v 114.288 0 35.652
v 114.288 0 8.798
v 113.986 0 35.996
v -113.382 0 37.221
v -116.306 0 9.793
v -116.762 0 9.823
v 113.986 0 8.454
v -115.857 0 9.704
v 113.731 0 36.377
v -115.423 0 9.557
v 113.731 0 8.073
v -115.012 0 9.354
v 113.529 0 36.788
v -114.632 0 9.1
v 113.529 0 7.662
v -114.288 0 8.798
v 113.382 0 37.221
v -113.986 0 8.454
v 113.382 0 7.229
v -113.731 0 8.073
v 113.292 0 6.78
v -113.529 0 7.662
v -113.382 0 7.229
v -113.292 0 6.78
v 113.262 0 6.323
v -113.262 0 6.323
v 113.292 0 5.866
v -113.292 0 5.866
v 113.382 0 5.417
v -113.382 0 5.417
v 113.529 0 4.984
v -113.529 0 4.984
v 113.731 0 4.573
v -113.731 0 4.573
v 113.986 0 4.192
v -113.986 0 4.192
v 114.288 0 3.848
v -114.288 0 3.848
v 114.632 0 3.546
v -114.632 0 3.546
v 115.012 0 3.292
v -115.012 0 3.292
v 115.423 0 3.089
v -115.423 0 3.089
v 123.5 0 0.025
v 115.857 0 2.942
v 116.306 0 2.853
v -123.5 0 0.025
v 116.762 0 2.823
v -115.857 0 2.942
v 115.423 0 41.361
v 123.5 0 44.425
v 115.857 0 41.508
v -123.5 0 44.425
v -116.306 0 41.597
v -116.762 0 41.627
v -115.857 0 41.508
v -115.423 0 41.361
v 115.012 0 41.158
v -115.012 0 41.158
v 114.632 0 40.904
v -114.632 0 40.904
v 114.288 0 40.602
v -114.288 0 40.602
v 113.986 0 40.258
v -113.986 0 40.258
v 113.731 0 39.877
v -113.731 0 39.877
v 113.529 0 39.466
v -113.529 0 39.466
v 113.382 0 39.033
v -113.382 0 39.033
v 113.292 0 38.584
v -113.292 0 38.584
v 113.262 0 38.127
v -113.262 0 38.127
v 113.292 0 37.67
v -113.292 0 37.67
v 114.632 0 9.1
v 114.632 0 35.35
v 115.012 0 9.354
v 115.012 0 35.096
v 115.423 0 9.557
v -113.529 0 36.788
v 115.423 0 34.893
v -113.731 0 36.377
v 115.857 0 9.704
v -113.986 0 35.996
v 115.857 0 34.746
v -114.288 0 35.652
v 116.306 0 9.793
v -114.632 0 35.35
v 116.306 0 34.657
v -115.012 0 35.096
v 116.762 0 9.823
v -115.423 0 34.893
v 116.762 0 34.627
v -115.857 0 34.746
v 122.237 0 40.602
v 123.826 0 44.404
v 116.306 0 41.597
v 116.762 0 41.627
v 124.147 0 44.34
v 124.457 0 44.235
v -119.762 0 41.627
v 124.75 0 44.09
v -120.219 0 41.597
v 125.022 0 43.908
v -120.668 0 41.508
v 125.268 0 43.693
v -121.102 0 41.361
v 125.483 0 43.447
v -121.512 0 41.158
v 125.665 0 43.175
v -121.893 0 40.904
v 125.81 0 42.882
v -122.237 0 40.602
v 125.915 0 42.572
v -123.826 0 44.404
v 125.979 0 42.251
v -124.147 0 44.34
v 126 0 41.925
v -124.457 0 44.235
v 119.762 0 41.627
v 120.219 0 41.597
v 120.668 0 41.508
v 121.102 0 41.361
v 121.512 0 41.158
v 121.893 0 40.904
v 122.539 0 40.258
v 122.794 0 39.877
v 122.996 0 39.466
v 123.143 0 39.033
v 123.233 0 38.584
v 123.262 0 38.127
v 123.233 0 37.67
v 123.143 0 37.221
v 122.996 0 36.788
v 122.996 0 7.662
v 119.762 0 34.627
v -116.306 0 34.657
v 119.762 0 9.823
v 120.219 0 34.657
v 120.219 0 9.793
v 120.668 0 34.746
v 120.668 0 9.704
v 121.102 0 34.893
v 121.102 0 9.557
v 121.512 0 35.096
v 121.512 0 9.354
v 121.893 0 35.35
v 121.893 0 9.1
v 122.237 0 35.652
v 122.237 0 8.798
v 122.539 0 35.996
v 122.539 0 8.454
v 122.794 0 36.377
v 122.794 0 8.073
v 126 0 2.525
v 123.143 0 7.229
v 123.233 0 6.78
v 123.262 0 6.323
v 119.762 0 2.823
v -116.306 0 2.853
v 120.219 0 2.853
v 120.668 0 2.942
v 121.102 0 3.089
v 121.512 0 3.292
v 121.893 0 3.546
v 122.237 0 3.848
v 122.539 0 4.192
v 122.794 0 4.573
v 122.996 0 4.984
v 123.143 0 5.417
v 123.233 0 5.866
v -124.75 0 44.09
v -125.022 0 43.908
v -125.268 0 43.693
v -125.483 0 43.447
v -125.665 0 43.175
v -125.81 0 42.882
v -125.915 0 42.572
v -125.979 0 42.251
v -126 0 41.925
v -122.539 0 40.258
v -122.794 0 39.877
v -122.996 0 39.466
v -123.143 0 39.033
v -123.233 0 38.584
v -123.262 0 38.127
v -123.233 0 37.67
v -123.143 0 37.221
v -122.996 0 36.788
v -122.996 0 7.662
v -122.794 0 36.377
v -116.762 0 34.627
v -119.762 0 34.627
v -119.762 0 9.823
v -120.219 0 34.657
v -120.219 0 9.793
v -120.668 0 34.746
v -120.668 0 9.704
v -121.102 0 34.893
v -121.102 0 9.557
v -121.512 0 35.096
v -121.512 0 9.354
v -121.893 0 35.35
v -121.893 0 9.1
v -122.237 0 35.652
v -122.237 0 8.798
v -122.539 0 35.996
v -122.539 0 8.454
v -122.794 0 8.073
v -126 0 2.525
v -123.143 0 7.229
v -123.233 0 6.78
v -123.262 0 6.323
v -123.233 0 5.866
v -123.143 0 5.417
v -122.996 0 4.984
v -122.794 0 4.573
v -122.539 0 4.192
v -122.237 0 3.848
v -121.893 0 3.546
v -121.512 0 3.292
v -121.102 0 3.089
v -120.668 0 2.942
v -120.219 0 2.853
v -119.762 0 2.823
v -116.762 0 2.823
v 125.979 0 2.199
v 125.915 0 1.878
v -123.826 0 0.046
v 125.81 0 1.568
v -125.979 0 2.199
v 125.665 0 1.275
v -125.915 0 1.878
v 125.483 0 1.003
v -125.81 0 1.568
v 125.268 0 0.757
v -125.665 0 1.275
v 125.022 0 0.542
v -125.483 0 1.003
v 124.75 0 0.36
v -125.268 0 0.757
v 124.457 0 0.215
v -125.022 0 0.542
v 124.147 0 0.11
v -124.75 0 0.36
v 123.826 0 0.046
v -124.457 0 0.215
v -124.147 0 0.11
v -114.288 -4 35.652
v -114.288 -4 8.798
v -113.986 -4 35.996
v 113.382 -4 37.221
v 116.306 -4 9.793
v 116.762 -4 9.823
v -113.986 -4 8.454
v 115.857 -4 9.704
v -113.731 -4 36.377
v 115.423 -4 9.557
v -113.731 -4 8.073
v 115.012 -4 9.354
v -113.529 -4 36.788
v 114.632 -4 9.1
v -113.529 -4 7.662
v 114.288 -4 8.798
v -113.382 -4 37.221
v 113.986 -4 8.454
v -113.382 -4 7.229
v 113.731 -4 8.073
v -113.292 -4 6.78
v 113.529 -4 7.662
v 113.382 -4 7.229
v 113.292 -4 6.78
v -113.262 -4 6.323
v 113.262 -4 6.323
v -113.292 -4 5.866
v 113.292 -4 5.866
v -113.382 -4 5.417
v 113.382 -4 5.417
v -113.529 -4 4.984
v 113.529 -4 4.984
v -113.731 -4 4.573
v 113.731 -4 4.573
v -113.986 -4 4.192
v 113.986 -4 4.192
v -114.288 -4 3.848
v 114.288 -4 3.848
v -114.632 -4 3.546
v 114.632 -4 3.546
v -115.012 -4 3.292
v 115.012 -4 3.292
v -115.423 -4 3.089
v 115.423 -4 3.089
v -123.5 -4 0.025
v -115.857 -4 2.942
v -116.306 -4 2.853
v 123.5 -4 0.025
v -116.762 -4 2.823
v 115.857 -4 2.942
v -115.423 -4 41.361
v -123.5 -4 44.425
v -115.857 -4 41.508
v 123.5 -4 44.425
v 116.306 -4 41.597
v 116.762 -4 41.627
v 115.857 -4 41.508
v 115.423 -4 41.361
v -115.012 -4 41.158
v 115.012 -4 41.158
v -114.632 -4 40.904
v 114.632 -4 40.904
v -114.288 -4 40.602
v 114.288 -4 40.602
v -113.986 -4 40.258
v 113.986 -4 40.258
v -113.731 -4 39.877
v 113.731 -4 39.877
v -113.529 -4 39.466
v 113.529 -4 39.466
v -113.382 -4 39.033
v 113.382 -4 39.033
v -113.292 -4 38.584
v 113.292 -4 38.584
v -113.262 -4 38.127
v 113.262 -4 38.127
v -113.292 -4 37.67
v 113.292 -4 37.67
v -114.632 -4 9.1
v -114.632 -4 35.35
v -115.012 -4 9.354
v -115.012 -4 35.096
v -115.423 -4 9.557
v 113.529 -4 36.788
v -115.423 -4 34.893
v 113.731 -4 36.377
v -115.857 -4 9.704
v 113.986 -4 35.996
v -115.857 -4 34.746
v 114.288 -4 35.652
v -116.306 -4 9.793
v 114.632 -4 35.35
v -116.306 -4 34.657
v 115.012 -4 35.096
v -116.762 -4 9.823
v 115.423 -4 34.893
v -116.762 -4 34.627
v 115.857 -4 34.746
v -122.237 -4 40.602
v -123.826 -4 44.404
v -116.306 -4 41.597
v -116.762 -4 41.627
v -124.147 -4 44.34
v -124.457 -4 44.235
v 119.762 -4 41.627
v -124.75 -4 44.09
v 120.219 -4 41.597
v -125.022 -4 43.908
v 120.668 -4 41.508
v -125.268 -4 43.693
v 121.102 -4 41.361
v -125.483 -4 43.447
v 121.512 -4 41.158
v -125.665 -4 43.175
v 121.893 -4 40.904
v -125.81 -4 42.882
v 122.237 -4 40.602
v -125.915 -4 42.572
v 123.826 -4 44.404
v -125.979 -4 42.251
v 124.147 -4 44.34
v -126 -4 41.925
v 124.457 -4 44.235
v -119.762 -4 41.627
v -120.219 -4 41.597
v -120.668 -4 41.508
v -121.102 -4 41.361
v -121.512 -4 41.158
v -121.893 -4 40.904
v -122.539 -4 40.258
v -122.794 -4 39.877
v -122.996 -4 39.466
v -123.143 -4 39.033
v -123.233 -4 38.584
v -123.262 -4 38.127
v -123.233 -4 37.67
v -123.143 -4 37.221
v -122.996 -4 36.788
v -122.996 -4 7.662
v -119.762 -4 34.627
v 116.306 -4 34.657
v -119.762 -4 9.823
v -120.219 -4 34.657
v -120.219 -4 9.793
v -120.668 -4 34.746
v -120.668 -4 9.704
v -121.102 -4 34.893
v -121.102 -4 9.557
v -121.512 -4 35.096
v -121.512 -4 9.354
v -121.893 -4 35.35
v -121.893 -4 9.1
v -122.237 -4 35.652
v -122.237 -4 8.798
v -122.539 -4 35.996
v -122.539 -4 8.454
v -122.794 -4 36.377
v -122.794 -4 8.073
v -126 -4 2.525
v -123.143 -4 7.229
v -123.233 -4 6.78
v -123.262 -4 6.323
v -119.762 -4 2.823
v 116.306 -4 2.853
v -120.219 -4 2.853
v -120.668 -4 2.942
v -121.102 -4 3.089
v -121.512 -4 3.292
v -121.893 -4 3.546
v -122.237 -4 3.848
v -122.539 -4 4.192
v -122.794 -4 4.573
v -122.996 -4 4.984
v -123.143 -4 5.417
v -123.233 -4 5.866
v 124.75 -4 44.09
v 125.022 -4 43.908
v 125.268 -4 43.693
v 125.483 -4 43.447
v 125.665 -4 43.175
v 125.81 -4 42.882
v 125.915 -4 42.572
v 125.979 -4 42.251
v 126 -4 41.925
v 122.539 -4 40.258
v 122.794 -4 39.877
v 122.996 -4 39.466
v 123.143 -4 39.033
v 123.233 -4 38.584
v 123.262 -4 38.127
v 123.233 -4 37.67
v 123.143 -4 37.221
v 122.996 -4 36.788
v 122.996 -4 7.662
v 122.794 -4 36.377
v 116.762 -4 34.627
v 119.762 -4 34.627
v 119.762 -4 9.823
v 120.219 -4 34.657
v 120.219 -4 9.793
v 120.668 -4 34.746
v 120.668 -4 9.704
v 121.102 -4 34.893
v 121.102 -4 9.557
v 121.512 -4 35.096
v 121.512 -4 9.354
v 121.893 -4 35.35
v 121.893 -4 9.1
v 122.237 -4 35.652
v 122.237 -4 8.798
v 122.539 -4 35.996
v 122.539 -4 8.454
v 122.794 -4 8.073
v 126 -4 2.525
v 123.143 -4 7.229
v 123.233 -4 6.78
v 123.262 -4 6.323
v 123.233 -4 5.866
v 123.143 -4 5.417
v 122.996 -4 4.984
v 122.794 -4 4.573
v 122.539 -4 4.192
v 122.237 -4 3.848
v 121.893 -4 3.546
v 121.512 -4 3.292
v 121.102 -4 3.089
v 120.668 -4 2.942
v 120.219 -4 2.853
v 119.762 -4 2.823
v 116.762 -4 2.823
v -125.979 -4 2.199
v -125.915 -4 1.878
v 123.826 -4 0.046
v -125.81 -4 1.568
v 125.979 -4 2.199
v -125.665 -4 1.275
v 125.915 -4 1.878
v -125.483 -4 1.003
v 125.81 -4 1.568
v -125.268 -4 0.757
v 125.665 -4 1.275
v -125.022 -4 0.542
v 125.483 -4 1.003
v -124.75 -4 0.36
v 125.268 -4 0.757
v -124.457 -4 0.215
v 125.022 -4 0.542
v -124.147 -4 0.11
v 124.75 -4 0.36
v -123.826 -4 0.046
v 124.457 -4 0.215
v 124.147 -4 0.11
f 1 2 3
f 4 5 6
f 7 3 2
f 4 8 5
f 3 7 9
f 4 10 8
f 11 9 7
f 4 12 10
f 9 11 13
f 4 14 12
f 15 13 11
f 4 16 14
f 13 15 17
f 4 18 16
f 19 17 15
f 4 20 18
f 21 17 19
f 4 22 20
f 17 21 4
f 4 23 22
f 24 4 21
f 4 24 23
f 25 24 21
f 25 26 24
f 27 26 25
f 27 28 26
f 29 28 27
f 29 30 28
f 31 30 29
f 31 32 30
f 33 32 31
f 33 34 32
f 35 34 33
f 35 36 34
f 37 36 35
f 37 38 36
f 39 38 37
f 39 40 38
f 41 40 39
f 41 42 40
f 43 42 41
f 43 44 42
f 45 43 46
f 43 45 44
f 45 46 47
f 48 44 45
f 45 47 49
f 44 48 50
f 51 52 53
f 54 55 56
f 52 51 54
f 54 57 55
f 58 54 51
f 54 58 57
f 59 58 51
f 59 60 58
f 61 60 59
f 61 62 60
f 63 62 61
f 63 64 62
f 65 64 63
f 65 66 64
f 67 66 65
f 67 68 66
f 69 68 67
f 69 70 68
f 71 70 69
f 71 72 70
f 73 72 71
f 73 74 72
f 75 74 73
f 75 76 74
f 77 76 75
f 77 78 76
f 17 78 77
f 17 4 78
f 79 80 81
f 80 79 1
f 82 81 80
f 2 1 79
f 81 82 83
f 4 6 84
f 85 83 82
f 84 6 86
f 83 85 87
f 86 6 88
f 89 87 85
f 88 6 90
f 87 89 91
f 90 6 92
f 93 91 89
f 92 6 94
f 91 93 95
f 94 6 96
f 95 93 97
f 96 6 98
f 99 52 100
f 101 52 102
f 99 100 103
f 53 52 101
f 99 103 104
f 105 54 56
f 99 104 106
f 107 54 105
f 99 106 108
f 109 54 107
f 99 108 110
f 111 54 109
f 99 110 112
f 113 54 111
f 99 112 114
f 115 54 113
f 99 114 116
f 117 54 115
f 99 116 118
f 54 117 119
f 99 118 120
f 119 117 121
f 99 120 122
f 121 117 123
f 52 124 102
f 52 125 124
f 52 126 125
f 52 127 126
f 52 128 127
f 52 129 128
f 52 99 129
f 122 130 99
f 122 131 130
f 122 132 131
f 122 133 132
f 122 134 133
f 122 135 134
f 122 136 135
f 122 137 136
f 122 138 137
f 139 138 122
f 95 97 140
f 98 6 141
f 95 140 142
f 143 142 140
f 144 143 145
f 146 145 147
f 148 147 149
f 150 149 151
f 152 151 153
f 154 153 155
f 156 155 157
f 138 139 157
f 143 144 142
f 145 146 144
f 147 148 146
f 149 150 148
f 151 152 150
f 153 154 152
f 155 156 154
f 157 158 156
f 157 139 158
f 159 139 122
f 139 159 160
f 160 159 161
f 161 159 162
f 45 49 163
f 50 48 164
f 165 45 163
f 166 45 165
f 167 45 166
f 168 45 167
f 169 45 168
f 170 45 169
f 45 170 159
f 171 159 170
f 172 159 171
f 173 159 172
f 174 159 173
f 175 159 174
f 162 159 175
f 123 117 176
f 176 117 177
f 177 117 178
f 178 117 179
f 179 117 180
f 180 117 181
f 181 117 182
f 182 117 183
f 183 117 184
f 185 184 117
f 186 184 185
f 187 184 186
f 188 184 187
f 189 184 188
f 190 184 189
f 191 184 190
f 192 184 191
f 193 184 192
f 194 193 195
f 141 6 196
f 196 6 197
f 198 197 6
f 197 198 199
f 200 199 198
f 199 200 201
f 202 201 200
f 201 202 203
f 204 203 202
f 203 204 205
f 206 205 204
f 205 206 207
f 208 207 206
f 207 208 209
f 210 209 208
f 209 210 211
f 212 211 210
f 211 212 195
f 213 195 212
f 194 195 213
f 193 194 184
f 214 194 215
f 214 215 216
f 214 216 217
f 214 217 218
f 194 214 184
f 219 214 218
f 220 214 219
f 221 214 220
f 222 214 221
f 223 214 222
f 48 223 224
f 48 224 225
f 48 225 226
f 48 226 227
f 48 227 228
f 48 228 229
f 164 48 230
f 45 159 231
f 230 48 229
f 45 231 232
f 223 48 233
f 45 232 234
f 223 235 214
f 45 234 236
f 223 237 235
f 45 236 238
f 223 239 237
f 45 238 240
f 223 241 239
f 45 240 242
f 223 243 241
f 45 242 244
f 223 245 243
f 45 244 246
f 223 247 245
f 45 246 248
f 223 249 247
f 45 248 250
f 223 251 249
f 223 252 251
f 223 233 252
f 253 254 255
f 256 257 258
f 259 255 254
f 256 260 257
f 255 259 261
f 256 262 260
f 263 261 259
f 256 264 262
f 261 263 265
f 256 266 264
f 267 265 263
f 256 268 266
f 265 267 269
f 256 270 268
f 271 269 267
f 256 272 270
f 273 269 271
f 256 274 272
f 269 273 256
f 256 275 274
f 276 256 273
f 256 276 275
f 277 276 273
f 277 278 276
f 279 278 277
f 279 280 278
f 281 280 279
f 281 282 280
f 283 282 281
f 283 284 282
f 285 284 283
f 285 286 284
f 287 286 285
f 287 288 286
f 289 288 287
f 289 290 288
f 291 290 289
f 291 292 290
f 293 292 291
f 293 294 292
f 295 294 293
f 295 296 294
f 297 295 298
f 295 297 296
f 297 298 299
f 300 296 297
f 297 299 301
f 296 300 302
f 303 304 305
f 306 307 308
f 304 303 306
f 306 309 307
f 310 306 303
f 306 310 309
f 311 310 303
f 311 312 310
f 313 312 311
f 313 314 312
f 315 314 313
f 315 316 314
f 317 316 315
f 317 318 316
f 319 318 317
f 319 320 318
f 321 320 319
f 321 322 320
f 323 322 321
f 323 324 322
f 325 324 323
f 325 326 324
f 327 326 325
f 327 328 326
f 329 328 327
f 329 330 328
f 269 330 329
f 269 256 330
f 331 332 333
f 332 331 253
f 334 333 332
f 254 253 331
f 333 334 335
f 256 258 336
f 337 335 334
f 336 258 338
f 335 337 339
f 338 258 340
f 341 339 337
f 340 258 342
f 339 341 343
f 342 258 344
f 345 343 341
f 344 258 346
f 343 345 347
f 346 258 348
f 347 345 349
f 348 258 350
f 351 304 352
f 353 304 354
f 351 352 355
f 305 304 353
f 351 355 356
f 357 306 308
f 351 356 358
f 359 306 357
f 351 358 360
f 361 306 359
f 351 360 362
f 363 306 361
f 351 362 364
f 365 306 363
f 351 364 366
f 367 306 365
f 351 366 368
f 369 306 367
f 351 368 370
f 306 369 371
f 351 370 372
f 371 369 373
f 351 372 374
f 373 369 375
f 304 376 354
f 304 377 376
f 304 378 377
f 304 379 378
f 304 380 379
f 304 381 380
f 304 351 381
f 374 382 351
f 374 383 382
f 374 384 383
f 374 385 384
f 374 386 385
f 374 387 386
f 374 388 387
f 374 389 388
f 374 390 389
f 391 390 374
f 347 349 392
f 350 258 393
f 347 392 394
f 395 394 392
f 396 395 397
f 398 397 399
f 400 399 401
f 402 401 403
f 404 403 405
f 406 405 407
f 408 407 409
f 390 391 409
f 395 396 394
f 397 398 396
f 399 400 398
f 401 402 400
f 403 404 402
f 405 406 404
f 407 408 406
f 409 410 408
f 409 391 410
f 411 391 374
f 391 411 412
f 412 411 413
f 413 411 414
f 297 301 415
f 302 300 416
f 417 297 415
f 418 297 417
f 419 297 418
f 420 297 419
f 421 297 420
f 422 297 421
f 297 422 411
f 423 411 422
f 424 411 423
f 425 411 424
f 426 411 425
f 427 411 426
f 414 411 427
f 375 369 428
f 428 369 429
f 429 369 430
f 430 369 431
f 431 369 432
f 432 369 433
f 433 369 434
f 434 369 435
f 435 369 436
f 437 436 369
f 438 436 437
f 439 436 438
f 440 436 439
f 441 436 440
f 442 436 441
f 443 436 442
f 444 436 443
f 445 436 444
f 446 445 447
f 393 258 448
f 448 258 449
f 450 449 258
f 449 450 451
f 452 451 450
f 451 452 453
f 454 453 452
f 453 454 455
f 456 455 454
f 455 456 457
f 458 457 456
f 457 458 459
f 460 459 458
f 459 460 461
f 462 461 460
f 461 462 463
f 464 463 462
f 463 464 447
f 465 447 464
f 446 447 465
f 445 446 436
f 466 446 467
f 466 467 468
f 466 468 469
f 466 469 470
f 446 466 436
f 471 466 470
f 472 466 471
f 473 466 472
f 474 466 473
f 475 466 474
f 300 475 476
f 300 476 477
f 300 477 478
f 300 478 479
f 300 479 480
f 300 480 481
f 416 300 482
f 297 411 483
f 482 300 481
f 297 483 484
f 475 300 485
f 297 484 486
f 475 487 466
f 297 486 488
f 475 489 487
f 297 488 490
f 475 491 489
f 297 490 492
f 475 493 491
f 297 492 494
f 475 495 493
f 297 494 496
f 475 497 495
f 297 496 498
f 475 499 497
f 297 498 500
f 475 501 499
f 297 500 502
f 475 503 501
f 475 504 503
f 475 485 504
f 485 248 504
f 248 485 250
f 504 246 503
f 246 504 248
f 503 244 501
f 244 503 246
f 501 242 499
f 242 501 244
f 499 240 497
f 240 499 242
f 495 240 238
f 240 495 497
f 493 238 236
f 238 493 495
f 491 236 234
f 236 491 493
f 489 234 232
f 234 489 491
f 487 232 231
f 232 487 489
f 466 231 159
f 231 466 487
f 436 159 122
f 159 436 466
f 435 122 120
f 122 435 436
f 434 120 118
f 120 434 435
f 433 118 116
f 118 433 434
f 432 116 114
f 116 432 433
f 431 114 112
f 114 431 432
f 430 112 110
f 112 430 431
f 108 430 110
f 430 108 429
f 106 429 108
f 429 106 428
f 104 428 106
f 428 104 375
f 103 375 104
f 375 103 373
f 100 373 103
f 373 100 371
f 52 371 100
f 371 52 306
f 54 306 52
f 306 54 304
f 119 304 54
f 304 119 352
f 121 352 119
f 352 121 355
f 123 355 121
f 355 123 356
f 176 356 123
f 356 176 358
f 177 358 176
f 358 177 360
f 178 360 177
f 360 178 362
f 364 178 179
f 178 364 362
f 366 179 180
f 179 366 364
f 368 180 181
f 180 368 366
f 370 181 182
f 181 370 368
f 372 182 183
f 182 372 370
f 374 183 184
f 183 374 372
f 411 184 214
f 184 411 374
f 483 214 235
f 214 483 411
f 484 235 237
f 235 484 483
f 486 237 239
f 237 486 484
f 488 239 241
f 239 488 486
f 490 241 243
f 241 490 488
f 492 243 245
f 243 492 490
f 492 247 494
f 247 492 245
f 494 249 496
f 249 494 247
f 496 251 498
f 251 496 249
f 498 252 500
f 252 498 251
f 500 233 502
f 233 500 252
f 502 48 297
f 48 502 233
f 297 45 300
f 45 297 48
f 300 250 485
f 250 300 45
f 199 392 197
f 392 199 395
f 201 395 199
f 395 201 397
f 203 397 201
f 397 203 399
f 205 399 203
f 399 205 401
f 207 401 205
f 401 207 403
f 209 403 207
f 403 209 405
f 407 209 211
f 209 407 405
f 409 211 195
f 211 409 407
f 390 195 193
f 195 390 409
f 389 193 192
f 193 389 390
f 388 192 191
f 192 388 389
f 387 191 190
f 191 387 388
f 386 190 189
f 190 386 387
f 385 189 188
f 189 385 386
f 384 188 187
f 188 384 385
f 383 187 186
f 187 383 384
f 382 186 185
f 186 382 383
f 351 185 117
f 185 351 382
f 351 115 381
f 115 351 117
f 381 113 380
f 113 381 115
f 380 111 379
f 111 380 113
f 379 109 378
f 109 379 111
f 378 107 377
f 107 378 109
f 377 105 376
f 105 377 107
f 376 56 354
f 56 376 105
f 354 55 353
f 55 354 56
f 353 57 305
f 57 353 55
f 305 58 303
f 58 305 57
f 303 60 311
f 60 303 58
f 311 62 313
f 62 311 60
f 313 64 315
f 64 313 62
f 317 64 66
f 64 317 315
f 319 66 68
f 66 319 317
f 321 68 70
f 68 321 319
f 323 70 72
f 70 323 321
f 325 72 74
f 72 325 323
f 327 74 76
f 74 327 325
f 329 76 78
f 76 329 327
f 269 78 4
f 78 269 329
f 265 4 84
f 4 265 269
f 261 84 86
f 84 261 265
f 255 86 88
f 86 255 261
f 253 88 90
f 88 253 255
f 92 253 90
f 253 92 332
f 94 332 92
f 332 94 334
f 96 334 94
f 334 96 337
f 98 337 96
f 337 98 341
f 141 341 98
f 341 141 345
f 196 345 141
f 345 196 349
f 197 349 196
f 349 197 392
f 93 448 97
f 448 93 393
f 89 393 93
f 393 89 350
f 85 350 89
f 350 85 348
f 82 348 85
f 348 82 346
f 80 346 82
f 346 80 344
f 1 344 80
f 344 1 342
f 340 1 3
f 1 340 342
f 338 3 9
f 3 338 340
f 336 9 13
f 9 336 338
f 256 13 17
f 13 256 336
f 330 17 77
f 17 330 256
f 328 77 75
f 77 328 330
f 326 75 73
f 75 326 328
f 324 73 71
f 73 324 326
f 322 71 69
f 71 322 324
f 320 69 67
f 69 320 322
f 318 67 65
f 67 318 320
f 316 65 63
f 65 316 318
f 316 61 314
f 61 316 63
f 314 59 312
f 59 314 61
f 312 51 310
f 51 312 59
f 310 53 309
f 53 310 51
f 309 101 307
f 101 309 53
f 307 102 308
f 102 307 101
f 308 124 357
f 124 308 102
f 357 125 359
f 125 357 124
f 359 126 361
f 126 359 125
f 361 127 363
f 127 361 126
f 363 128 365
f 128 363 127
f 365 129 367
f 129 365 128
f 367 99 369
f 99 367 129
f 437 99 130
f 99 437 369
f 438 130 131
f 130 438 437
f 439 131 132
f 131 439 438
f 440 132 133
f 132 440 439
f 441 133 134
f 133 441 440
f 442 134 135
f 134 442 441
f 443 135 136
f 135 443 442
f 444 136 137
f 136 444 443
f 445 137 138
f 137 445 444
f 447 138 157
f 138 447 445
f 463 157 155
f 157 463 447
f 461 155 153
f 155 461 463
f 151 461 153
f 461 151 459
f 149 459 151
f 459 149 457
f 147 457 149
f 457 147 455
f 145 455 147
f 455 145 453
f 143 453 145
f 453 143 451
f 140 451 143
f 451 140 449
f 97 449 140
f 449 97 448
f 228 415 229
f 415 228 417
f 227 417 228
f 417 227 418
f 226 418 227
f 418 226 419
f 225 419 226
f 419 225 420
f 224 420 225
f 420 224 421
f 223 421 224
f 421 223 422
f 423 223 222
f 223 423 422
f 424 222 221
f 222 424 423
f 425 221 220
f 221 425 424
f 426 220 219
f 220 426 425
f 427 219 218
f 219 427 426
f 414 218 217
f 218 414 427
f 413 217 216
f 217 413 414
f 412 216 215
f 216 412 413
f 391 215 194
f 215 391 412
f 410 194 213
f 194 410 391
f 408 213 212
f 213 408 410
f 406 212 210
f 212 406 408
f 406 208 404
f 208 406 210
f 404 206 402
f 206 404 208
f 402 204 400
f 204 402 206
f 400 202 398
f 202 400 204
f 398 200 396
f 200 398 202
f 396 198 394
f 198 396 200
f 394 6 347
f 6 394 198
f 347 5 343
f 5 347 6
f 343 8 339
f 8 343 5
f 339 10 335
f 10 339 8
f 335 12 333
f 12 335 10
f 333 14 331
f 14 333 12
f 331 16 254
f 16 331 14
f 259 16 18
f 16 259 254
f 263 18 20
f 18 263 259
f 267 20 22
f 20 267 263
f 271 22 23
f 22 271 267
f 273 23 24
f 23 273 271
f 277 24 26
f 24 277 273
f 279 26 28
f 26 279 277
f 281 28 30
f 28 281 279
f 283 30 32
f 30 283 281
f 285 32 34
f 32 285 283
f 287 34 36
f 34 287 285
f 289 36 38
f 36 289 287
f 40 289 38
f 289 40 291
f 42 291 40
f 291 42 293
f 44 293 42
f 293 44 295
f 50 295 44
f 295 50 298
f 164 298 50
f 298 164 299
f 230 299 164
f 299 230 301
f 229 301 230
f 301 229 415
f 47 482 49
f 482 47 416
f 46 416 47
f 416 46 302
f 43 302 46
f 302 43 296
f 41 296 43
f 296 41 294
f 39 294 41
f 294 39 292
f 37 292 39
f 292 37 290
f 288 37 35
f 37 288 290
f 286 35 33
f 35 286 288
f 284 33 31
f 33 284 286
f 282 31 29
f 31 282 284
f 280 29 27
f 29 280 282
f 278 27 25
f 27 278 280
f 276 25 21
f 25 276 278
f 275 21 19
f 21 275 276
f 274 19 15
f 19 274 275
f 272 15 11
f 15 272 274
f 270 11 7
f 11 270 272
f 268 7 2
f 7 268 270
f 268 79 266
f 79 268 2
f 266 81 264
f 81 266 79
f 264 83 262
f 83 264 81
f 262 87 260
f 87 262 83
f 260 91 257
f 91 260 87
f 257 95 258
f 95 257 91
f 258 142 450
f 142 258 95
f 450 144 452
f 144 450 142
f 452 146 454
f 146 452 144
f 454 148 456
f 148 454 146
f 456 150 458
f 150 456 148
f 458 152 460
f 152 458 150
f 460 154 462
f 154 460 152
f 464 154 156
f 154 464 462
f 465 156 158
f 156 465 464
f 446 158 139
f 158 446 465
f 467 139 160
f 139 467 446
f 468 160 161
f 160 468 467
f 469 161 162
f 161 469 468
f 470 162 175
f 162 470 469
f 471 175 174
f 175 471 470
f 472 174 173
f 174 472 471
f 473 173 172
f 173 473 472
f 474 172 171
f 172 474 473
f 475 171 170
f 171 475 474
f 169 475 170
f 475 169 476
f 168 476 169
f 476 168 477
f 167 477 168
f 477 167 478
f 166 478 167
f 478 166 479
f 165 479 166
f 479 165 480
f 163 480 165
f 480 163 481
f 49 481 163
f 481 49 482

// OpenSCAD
// Lab Rax generic equipment tray + faceplate (wizard template).
// Faceplate derived from the Pi4 baseline; rack holes follow the four-corner layout of the user-supplied
// 1U blank plate (faceplate_mounting.json): EVERY rack unit gets 4 holes, never a single centre pair.
// The wizard appends override assignments at the end of this file.
// PROPOSED, UNVALIDATED: printed fit, strength and rack clearance are UNKNOWN.
$fn=48;
part="assembly";            // assembly, faceplate, tray, combined, rear_bracket
// Device envelope (mm). Origin of hole coordinates = device front-left corner, seen from above.
dev_w=85; dev_d=56; dev_h=20;
feet=[];                     // [[x,y,w,d,h],...] underside feet, device frame front-left origin
holes=[];                   // [[x,y],...] mounting hole centres
hole_d=2.7;                 // device mounting hole diameter
device_mount="inserts";     // inserts, pegs, clips, straps
standoff=6;                 // device lift above tray floor
insert_pilot=3.2;           // pilot for heat-set insert (inserts mode)
board_t=1.6;                // board/flange thickness (pegs, clips)
joint="screw";              // screw, single ("snap" retired 2026-10-19: too brittle; kept as history)
u=1;                        // faceplate height in rack units
keystones=[];               // [x,...] keystone centres on faceplate (X=0 centre)
// Keystone v2 (2026-10-19, now the fallback; see ks_style): re-modelled from measurements of Brian's reference keystone frame
// (14.5 x 16 opening was too narrow when printed). Opening 14.8 x 16.6 through the plate, plus a rear collar
// 19.8 x 27.85 reaching 9.2 mm behind the front face (bottom lip to 10.4) that carries the latch ramp and catches.
ks_w=14.8; ks_h=16.6;       // front opening
ks_ow=19.8; ks_ob=11.9; ks_ot=15.95; ks_od=9.2; ks_lip=10.4;  // collar width, below/above opening centre, depth
ports=[];                   // [[x,z,w,h,r],...] faceplate cut-outs, z from slot bottom, r=corner radius
front_gap=12;               // device front to faceplate rear face
margin=8;                   // tray border around device
dev_off_x=0;                // device left/right offset, mm from centred (+ = right, seen from the front)
dev_off_y=0;                // device front/back offset, mm added to front_gap (+ = toward the rear)
dev_rot=0;                  // device rotation seen from above: 0, 90, 180, 270 (90/270 swap width and depth)
rear_support=false;         // heavy/deep equipment: tray runs to the rear posts and screws to a rear bracket
coupon=[];                  // test coupon: [x0,x1,ymax] keeps only that slice of the part

// 4 mm plate (owner default 2026-10-18). Corner radius is limited by the four-corner holes:
// the reference holes sit 1.6 mm from the top/bottom edge, so larger corners would cut into them.
rack_pitch=44.45; plate_gap=0.05; legacy_slot_offset=1.225;
plate_bottom=plate_gap/2; plate_center=u*rack_pitch/2;
plate_w=252; plate_t=4; plate_r=2.5; plate_h=u*rack_pitch-plate_gap;
hole_x=118.2625; hole_dz=15.902;   // each U: holes at its centre ±hole_dz (6.323 / 38.127 above the slot bottom)
rack_depth=240;             // Lab Rax frame depth (front of front posts to back of rear posts)
nudge=0;                    // render-repair only: tiny size offset applied when OpenSCAD 2021 emits a sliver
sleeve=device_mount=="sleeve";
// PROPOSED sleeve defaults (mm); independent design, fit and strength UNKNOWN.
sl_side=0.5; sl_top=0.3; sl_wall=6; sl_lip_w=10; sl_lip_t=1.5; sl_band=1.5; sl_stop_t=4; sl_stop_h=6;
foot_clearance=0.5; foot_extra_depth=0.3; foot_min_floor=0.8; foot_lip_t=3.0;
tray_t=3; floor_z=(device_mount=="flat"||sleeve)?0.5:7+legacy_slot_offset; tray_z=floor_z; // @flat-floor
assert(dev_rot==0||dev_rot==90||dev_rot==180||dev_rot==270,"dev_rot must be 0, 90, 180 or 270");
// Device footprint on the tray after rotation; the tray stays centred and grows to keep the margin.
fp_w=(dev_rot==90||dev_rot==270)?dev_d:dev_w; fp_d=(dev_rot==90||dev_rot==270)?dev_w:dev_d;
rack_inner_w=208; side_clear=2; max_tray=rack_inner_w-2*side_clear; // PROPOSED nominal opening / side clearance
tray_w=2*(abs(dev_off_x)+fp_w/2+(sleeve?max(margin,sl_side+sl_wall):margin)); tray_d=rear_support?rack_depth:sleeve?-plate_t+fp_d+margin:dev_off_y+fp_d+front_gap+margin;
tray_x=-tray_w/2; tray_y=0;
 // @flat-begin
assert(device_mount!="flat"||front_gap+dev_off_y>=6.2,"Flat corner stops need a front gap of at least 6.2 mm");
assert(device_mount!="flat"||joint!="screw"||front_gap+dev_off_y>=11.5,"Flat device must clear the front screw joint (front gap >= 11.5 mm)");
assert(device_mount!="flat"||!rear_support||front_gap+dev_off_y+fp_d<=rack_depth-11.5,"Flat device must clear the rear screw joint (rear gap >= 11.5 mm)");
 // @flat-end
dev_x=-fp_w/2+dev_off_x; dev_y=sleeve?-plate_t:front_gap+dev_off_y; floor_top=tray_z+tray_t;
assert(tray_w<=max_tray,str("This tray is ",tray_w," mm wide but the rack opening allows ",max_tray," mm (",rack_inner_w," mm minus ",side_clear," mm each side). Try Rotate 90 degrees, or reduce dev_off_x."));
assert(sleeve||dev_y>=0,str("Device moved into the faceplate: dev_off_y must be at least ",-front_gap));
assert(!rear_support||dev_y+fp_d+margin<=rack_depth,"Device moved past the rear posts; reduce dev_off_y");
// Device-frame point [x,y] (front-left origin, unrotated) -> footprint offset from [dev_x,dev_y].
function dp(p)=dev_rot==90?[dev_d-p[1],p[0]]:dev_rot==180?[dev_w-p[0],dev_d-p[1]]:dev_rot==270?[p[1],dev_w-p[0]]:p;
foot_h=(device_mount=="flat"||sleeve)?max([0,for(f=feet)f[4]]):0; foot_depth=foot_h>0?foot_h+foot_extra_depth:0;
sl_half=fp_w/2+sl_side; sl_bottom=floor_top; sl_window_top=sl_bottom+dev_h-foot_h+sl_top;  // case rests on the floor top; feet hang in pockets foot_extra_depth deeper
sl_lip=sl_window_top+(foot_h>0?foot_lip_t:sl_lip_t)<=u*rack_pitch?(foot_h>0?foot_lip_t:sl_lip_t):0;
sl_rear=dev_y+fp_d;
sl_joints=[dev_off_x-sl_half-sl_wall/2,dev_off_x+sl_half+sl_wall/2];
sl_joint_z=[sl_bottom+3,sl_window_top-3];
assert(!sleeve||fp_d/4-plate_t-6>=8,"Sleeve depth must be at least 72 mm to keep strap slots clear of the front joint");
assert(!sleeve||sl_bottom-plate_bottom>=sl_band&&u*rack_pitch-plate_bottom-sl_window_top>=sl_band,str("Too tall for a flush window in ",u,"U; choose ",u+1,"U"));
assert(!sleeve||!rear_support||sl_rear+sl_stop_t<=rack_depth-11.5,"Sleeve rear stop must clear rear joint by 11.5 mm");
assert(!sleeve||joint!="screw"||sl_window_top-sl_bottom>=10,"Sleeve screw joint needs a window at least 10 mm tall");
jx=min(40,tray_w/2-12); joint_x=[-jx,jx];
tongue_w=12; tongue_depth=7; tongue_h=3; tongue_z=tray_z+3.5;
slot_clear=0.3; boss_d=9; m3_clear=3.4; joint_pilot=4.0;  // 4.0 = the printed, well-fitting Pi4 trial

module capsule2d(len=10,diam=7){hull(){translate([-(len-diam)/2,0])circle(d=diam);translate([(len-diam)/2,0])circle(d=diam);}}
module rrect(w,h,r){rr=min(r,w/2-0.01,h/2-0.01);if(rr<=0)square([w,h],center=true);else offset(r=rr)square([w-2*rr,h-2*rr],center=true);}
// Mirror front-of-tray features to the rear (about the rack's mid-depth).
module to_rear(){translate([0,rack_depth/2,0])mirror([0,1,0])translate([0,-rack_depth/2,0])children();}

// Faceplate outline seen from the front: 2D X = rack X, 2D Y = height Z.
// rear=true cuts the larger keystone pocket; plain=true leaves out keystones/ports (rear bracket).
module plate2d(rear=false,plain=false){
 difference(){
  hull()for(sx=[-1,1],sz=[-1,1])translate([sx*(plate_w/2-plate_r),plate_center+sz*(plate_h/2-plate_r)])circle(r=plate_r+nudge);
  for(i=[0:u-1],dz=[-hole_dz,hole_dz],x=[-hole_x,hole_x])translate([x,i*rack_pitch+rack_pitch/2+dz])capsule2d();
  if(!plain){
   if(sleeve)translate([dev_off_x,(sl_bottom+sl_window_top)/2])square([2*sl_half,sl_window_top-sl_bottom],center=true);
   for(p=ports)translate([p[0],p[1]])rrect(p[2],p[3],p[4]);
  }
 }
}
// Plate between y=y0 (front) and y0+t, built from the 2D outline (cleaner meshes than 3D cuts in OpenSCAD 2021).
module plate_layer(y0,t,rear=false,plain=false){translate([0,y0+t,0])rotate([90,0,0])linear_extrude(height=t)plate2d(rear,plain);}

module plate_joint_add(rear=false){
 if(joint=="screw"&&(!sleeve||rear)){
  for(x=joint_x)translate([x-tongue_w/2,0,tongue_z])cube([tongue_w,tongue_depth,tongue_h]);
  for(x=joint_x)translate([x,0,tray_z+14])rotate([-90,0,0])cylinder(d=boss_d,h=8);
 }
 if(joint=="snap") for(x=joint_x){
  // Cantilever arm under the tray floor; barb snaps up into a floor window.
  translate([x-4,0,tray_z-2])cube([8,16,2]);
  // Barb v2: square catch face toward the plate, ramp falling toward the rear so the tray, slid in
  // from the rear, cams the arm down until its window drops over the barb.
  translate([x-4,12,tray_z])hull(){cube([8,0.6,1.2]);cube([8,2.4,0.01]);}
 }
}
// Keystone collar behind the plate, and the jack-shaped cut through plate + collar.
// Profile in (d = depth behind front face, z from opening centre); X width is ks_w throughout.
module ks_collar(){for(k=keystones)let(x=is_list(k)?k[0]:k,kz=is_list(k)&&len(k)>1?k[1]:plate_center)translate([x-ks_ow/2,-plate_t,kz]){
 translate([0,0,-ks_ob])cube([ks_ow,ks_od,ks_ob+ks_ot]);
 translate([0,0,-ks_ob])cube([ks_ow,ks_lip,ks_ob-ks_h/2]);
}}
module ks_cut(){for(k=keystones)let(x=is_list(k)?k[0]:k,kz=is_list(k)&&len(k)>1?k[1]:plate_center)translate([x-ks_w/2,-plate_t,kz])rotate([90,0,90])linear_extrude(height=ks_w)
 polygon([[-1,-ks_h/2],[5.8,-ks_h/2],[5.8,-9.9],[9.2,-9.9],[9.2,-ks_h/2],[11,-ks_h/2],[11,11.6],[8.2,11.6],
          [8.2,ks_ot+1],[7.2,ks_ot+1],[7.2,13.6],[0.6,ks_h/2],[-1,ks_h/2]]);}
// Golden keystone (Brian, 2026-10-19): exact cross-sections of the keystone on Brian's SG108 faceplate, which fits
// perfectly in practice. Source: "10 inch shelf TP-Link SG108 Plus Keystone" by Goul (MakerWorld remix, BY-NC-SA),
// local/personal use only, never redistributed. Each band: [X from opening centre, width, polygons in source (Y, Z)]
// with source Y running down the plate (opening centre Y=25.09) and Z = depth (keystone face 0, plate back 4.08).
// The block replaces the plate within 21 x 33.5 mm around each keystone; front face sits 0.08 proud like the source.
ks_style="golden";          // golden (SG108 copy) or v2 (own measured rebuild, kept as fallback)
// Brian, 2026-10-19: the golden v3 print fit left/right well but had ~0.4 mm play up/down. ks_tight moves the
// bottom (hook-side) edge of the opening, its hook groove and lip up by this much; the latch side is unchanged.
ks_tight=0.2;  // Brian, 2026-10-19: v5 coupon (0.2) printed a perfect fit; v4 (0.4) was too tight.
KS_GOLD=[
  [-10.50,0.60,[[[45.500,4.080],[45.500,0.080],[38.691,0.080],[38.691,0.000],[7.251,0.000],[7.251,0.080],[1.000,0.080],[1.000,4.080],[1.071,4.080]]]],
  [-9.90,0.98,[[[9.143,4.080],[9.143,6.600],[9.205,7.147],[9.207,7.160],[9.226,7.216],[9.395,7.692],[9.679,8.145],[9.697,8.169],[10.075,8.546],[10.099,8.565],[10.551,8.848],[11.083,9.036],[11.643,9.100],[13.493,9.100],[14.293,9.900],[33.393,9.900],[33.893,10.400],[34.493,10.400],[35.054,10.336],[35.586,10.148],[36.038,9.865],[36.062,9.846],[36.439,9.469],[36.458,9.445],[36.742,8.992],[36.753,8.965],[36.930,8.460],[36.993,7.900],[36.993,4.080],[45.500,4.080],[45.500,0.080],[38.691,0.080],[38.691,0.000],[7.251,0.000],[7.251,0.080],[1.000,0.080],[1.000,4.080],[1.014,4.080]]]],
  [-8.92,1.52,[[[7.551,4.080],[7.551,2.250],[9.143,2.250],[9.143,6.600],[9.209,7.169],[9.367,7.620],[9.404,7.709],[9.658,8.114],[9.716,8.190],[9.755,8.229],[10.054,8.527],[10.130,8.586],[10.534,8.840],[10.623,8.876],[11.074,9.034],[11.643,9.100],[13.493,9.100],[14.293,9.900],[33.393,9.900],[33.893,10.400],[34.493,10.400],[35.063,10.334],[35.514,10.176],[35.603,10.140],[36.006,9.886],[36.083,9.827],[36.420,9.490],[36.479,9.414],[36.719,9.030],[36.737,9.000],[36.770,8.920],[36.927,8.469],[36.993,7.900],[36.993,2.250],[38.551,2.250],[38.551,4.080],[45.500,4.080],[45.500,0.080],[38.691,0.080],[38.691,0.000],[7.251,0.000],[7.251,0.080],[1.000,0.080],[1.000,4.080],[1.044,4.080]]]],
  [-7.40,14.80,[[[7.551,4.080],[7.551,2.250],[9.143,2.250],[9.143,6.600],[9.175,6.878],[9.229,7.247],[9.478,7.850],[9.876,8.368],[10.393,8.765],[10.996,9.015],[11.365,9.069],[11.643,9.100],[13.493,9.100],[13.493,8.100],[11.493,8.100],[11.493,7.200],[16.793,0.500],[16.793,0.000],[7.251,0.000],[7.251,0.080],[1.000,0.080],[1.000,4.080],[1.025,4.080]],[[45.500,4.080],[45.500,0.080],[38.691,0.080],[38.691,0.000],[33.393,0.000],[33.393,5.800],[34.993,5.800],[34.993,8.400],[33.393,8.400],[33.393,9.900],[33.893,10.400],[34.493,10.400],[34.771,10.369],[35.140,10.315],[35.743,10.065],[36.200,9.715],[36.261,9.668],[36.658,9.150],[36.908,8.547],[36.962,8.178],[36.993,7.900],[36.993,2.250],[38.551,2.250],[38.551,4.080],[42.555,4.080]]]],
  [7.40,2.50,[[[45.500,4.080],[45.500,0.080],[38.691,0.080],[38.691,0.000],[7.251,0.000],[7.251,0.080],[1.000,0.080],[1.000,4.080],[7.551,4.080],[7.551,2.250],[9.143,2.250],[9.143,6.600],[9.209,7.168],[9.370,7.630],[9.402,7.705],[9.662,8.120],[9.712,8.185],[9.927,8.400],[10.059,8.531],[10.124,8.582],[10.538,8.841],[10.614,8.873],[11.075,9.034],[11.643,9.100],[13.493,9.100],[14.293,9.900],[33.393,9.900],[33.893,10.400],[34.493,10.400],[35.062,10.335],[35.523,10.172],[35.599,10.141],[36.013,9.882],[36.078,9.831],[36.425,9.486],[36.474,9.420],[36.735,9.005],[36.767,8.930],[36.928,8.467],[36.993,7.900],[36.993,2.250],[38.551,2.250],[38.551,4.080],[42.599,4.080]]]],
  [9.90,0.60,[[[45.500,4.080],[45.500,0.080],[38.691,0.080],[38.691,0.000],[7.251,0.000],[7.251,0.080],[1.000,0.080],[1.000,4.080],[7.551,4.080],[7.551,2.250],[38.551,2.250],[38.551,4.080],[42.635,4.080]]]]
];
// Depths are shifted by -0.08 before polygon() and the 0.08 is added back in the 3D transform: OpenSCAD 2021 snaps 2D
// points to a 1/65536 mm grid, which put the plate-flush faces (Z 0.08 / 4.08) 0.0000134 mm off the plate and left a
// non-manifold sliver edge. Shifted, those faces sit at exactly 0 and 4.0 (on the grid); the shape is unchanged.
// The block is cut 0.1 mm oversize in height, then clipped in rack coordinates by the same box as ks_box_cut, so its
// top/bottom faces are the very same numbers as the plate opening (the transform alone landed them a hair off).
module ks_golden(){for(k=keystones)let(x=is_list(k)?k[0]:k,kz=is_list(k)&&len(k)>1?k[1]:plate_center)intersection(){
 translate([x,0,kz])multmatrix([[1,0,0,0],[0,0,1,-4],[0,-1,0,25.09],[0,0,0,1]])intersection(){
  union()for(b=KS_GOLD)translate([b[0],0,0])rotate([90,0,90])linear_extrude(height=b[1])for(pg=b[2])
   translate([b[1]>10&&min([for(q=pg)q[0]])>30?-ks_tight:0,0])polygon([for(q=pg)[q[0],q[1]-0.08]]);  // opening band, hook side
  translate([-10.5,25.09-18.6,-0.09])cube([21,33.7,10.42]);
 }
 translate([x-10.5,-plate_t-1,kz-15])cube([21,plate_t+16,33.5]);
}}
module ks_box_cut(){for(k=keystones)let(x=is_list(k)?k[0]:k,kz=is_list(k)&&len(k)>1?k[1]:plate_center)translate([x-10.5,-plate_t-0.01,kz-15])cube([21,plate_t+0.02,33.5]);}
module plate_joint_cut(rear=false){if(joint=="screw"&&(!sleeve||rear))for(x=joint_x)translate([x,-0.1,tray_z+14])rotate([-90,0,0])cylinder(d=joint_pilot,h=8.2);}

module faceplate(){
 union(){
  difference(){
   union(){
    plate_layer(-plate_t,plate_t);
    if(ks_style=="v2")ks_collar();
    plate_joint_add();
   }
   plate_joint_cut();
   if(sleeve&&joint=="screw")for(x=sl_joints,z=sl_joint_z)translate([x,-plate_t-0.1,z])rotate([-90,0,0])cylinder(d=m3_clear,h=plate_t+0.2);
   if(ks_style=="v2")ks_cut(); else ks_box_cut();
  }
  if(ks_style!="v2")ks_golden();
 }
}
// Plain plate on the rear posts (mirror of the faceplate, no openings) that the tray's rear end screws/snaps to.
module rear_bracket(){to_rear()difference(){union(){plate_layer(-plate_t,plate_t,false,true);plate_joint_add(true);}plate_joint_cut(true);}}

module device_features_add(){
 if(sleeve){
  for(side=[-1,1]){
   x=side<0?dev_off_x-sl_half-sl_wall:dev_off_x+sl_half;
   translate([x,0,floor_top])cube([sl_wall,sl_rear,sl_window_top-floor_top]);
   if(sl_lip>0)translate([side<0?x:dev_off_x+sl_half-min(sl_lip_w,sl_half),0,sl_window_top])cube([sl_wall+min(sl_lip_w,sl_half),sl_rear,sl_lip]);
  }
  translate([dev_x,sl_rear,floor_top])cube([fp_w,sl_stop_t,min(sl_stop_h,dev_h-foot_h)]);
 }

 // @flat-begin
 if(device_mount=="flat"){
  // Corner stops outside the footprint, with 0.2 mm nominal clearance. Retention UNKNOWN.
  for(x=[dev_x-6.2,dev_x+fp_w+0.2],y=[dev_y,dev_y+fp_d-min(6,fp_d)])
   translate([x,y,floor_top])cube([6,min(6,fp_d),min(6,dev_h-foot_h)]);
  for(x=[dev_x,dev_x+fp_w-min(6,fp_w)],y=[dev_y-6.2,dev_y+fp_d+0.2])
   translate([x,y,floor_top])cube([min(6,fp_w),6,min(6,dev_h-foot_h)]);
 }
 // @flat-end
 if(device_mount=="inserts")for(h=[for(q=holes)dp(q)])translate([dev_x+h[0],dev_y+h[1],floor_top])cylinder(d=max(insert_pilot+3.5,7),h=standoff);
 if(device_mount=="pegs")for(h=[for(q=holes)dp(q)])translate([dev_x+h[0],dev_y+h[1],floor_top]){
  cylinder(d=hole_d+3,h=standoff);
  translate([0,0,standoff])cylinder(d=hole_d-0.3,h=board_t+0.8);
  translate([0,0,standoff+board_t+0.8])cylinder(d1=hole_d-0.3,d2=hole_d-1,h=0.8);
 }
 if(device_mount=="clips"){
  // Support ledges at the four corners plus a flexing clip on each side.
  for(x=[dev_x-1,dev_x+fp_w-5],y=[dev_y-1,dev_y+fp_d-5])translate([x,y,floor_top])cube([6,6,standoff]);
  for(s=[-1,1])translate([s>0?dev_x+fp_w+0.2:dev_x-2.2,dev_y+fp_d/2-5,floor_top]){
   cube([2,10,standoff+board_t+2.5]);
   translate([s>0?-1.2:2,0,standoff+board_t+0.2])hull(){cube([1.2,10,1.6]);translate([s>0?1.2:0,0,1.6])cube([0.01,10,0.6]);}
  }
 }
}
module device_features_cut(){
 if(sleeve&&joint=="screw")for(x=sl_joints,z=sl_joint_z)translate([x,-0.1,z])rotate([-90,0,0])cylinder(d=joint_pilot,h=8.1);
 // Strap access through each wall at quarter-depth, clear of the front/rear joints.
 if(sleeve)for(side=[-1,1],y=[dev_y+fp_d*0.25,dev_y+fp_d*0.75])
  translate([side<0?dev_off_x-sl_half-sl_wall-0.1:dev_off_x+sl_half-0.1,y-6,floor_top-0.1])cube([sl_wall+0.2,12,3.1]);

 if(device_mount=="inserts")for(h=[for(q=holes)dp(q)])translate([dev_x+h[0],dev_y+h[1],floor_top+0.01])cylinder(d=insert_pilot,h=standoff+0.1);
 if(device_mount=="straps"||device_mount=="flat"||sleeve)for(x=[dev_x-5.5,dev_x+fp_w+2.5],y=[dev_y+fp_d*0.25,dev_y+fp_d*0.75])
  translate([x,y-6,tray_z-0.1])cube([3,12,tray_t+0.2]);
 // Blind pockets retain at least foot_min_floor; taller feet pass through the floor by design.
 if(foot_h>0&&(device_mount=="flat"||sleeve))for(f=feet){corners=[dp([f[0],f[1]]),dp([f[0]+f[2],f[1]]),dp([f[0],f[1]+f[3]]),dp([f[0]+f[2],f[1]+f[3]])];x0=dev_x+min([for(p=corners)p[0]])-foot_clearance;x1=dev_x+max([for(p=corners)p[0]])+foot_clearance;y0=dev_y+min([for(p=corners)p[1]])-foot_clearance;y1=dev_y+max([for(p=corners)p[1]])+foot_clearance;deep=f[4]+foot_extra_depth;
  translate([x0,y0,deep>tray_t-foot_min_floor?tray_z-0.1:floor_top-deep])cube([x1-x0,y1-y0,deep>tray_t-foot_min_floor?tray_t+0.2:deep+0.02]);}
}

module tray_joint_add(rear=false){
 if(joint=="screw"&&(!sleeve||rear)){
  for(x=joint_x) translate([x-9,0,tray_z+tray_t])cube([18,8,5]);
  for(x=joint_x)translate([x-7,8.3,tray_z+3])cube([14,3,19]);
  for(x=joint_x) for(side=[-1,1]) translate([x+side*6-1,0,0])
    hull(){translate([0,9,tray_z+2.7])cube([2,2,0.5]);
           translate([0,9,tray_z+8])cube([2,2,0.5]);
           translate([0,(device_mount=="flat"||sleeve)?9.5:20,tray_z+2.7])cube([2,2,0.5]);}
 }
}
module tray_joint_cut(rear=false){
 if(joint=="screw"&&(!sleeve||rear)){
  for(x=joint_x)translate([x-(tongue_w+slot_clear)/2,-0.1,tongue_z-slot_clear/2])cube([tongue_w+slot_clear,tongue_depth+slot_clear,tongue_h+slot_clear]);
  for(x=joint_x)translate([x,11.4,tray_z+14])rotate([90,0,0])cylinder(d=m3_clear,h=12);
 }
 if(joint=="snap")for(x=joint_x)translate([x-4.3,11.6,tray_z-0.1])cube([8.6,3.2,tray_t+0.2]);
}

module tray(){
 difference(){
  union(){
   translate([tray_x,tray_y,tray_z])cube([tray_w,tray_d,tray_t]);
   tray_joint_add();
   if(rear_support)to_rear()tray_joint_add(true);
   device_features_add();
  }
  tray_joint_cut();
  if(rear_support)to_rear()tray_joint_cut(true);
  device_features_cut();
 }
}

module clip_coupon(){if(len(coupon)==3)intersection(){children();translate([coupon[0],-50,-50])cube([coupon[1]-coupon[0],coupon[2]+50,400]);}else children();}

clip_coupon(){
 if(part=="faceplate")faceplate();
 else if(part=="tray")tray();
 else if(part=="rear_bracket")rear_bracket();
 else if(part=="combined")union(){faceplate();translate([tray_x,-0.01,tray_z])cube([tray_w,0.02+0.01,tray_t]);tray();if(rear_support)rear_bracket();}
 else {color("steelblue")faceplate();color("silver")tray();if(rear_support)color("steelblue")rear_bracket();
  %translate([dev_x,dev_y,floor_top+(device_mount=="inserts"||device_mount=="pegs"||device_mount=="clips"?standoff:0)-foot_h])cube([fp_w,fp_d,dev_h]);}
}

// ---- wizard overrides: Faceplate only
dev_w=5.0;
dev_d=5.0;
dev_h=1.0;
hole_d=2.7;
standoff=0.0;
insert_pilot=3.2;
board_t=1.6;
u=1;
holes=[];
keystones=[];
device_mount="straps";
joint="none";
rear_support=false;
coupon=[];
ports=[];
part="faceplate";
